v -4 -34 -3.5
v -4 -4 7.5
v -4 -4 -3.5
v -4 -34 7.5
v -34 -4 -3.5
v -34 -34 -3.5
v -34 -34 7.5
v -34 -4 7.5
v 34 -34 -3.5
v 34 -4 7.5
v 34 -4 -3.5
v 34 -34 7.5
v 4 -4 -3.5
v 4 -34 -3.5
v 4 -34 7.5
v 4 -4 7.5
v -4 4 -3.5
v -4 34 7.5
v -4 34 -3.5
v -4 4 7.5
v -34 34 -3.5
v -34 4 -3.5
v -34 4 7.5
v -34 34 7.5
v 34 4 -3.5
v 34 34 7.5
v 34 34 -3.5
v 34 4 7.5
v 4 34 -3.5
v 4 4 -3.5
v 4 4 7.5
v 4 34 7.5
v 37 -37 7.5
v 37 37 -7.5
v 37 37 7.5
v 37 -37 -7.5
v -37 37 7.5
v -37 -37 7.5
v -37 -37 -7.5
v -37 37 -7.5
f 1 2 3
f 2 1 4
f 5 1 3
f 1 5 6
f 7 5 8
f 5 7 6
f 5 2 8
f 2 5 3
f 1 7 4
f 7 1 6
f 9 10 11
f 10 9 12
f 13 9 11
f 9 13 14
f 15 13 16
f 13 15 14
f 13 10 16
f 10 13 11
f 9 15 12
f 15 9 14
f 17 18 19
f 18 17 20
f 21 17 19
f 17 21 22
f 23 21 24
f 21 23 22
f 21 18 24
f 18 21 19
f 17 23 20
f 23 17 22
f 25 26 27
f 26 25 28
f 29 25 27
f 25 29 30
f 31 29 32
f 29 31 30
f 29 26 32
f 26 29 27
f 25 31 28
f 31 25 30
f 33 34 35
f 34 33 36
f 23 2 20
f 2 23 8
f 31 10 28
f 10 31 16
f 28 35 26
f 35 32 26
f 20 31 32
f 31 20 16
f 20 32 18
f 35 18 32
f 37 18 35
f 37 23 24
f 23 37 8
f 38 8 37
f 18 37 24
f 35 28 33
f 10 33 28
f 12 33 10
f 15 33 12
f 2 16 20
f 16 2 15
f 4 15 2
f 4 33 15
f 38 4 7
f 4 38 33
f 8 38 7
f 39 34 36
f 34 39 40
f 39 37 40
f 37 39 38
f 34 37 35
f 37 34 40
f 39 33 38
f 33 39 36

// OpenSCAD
$fn = 32;

// ----------------------------------------------------------------------
// Pocket plate 74 x 74 x 15
// 2 x 2 pockets 30 mm square, 11 mm deep
// ----------------------------------------------------------------------

// --- parameters (mm) ---
thickness = 15;  // plate thickness
floor_t = 4;     // material left under each pocket
pocket = 30;     // pocket side length
pitch_x = 38;    // pocket pitch along X
pitch_y = 38;    // pocket pitch along Y
cols = 2;        // pockets per row
rows = 2;        // rows of pockets

// --- derived feature positions (mm) ---
depth = thickness - floor_t;        // = 11   pocket depth, down to the floor
span_x = (cols - 1) * pitch_x;      // = 38   distance between outer pockets
span_y = (rows - 1) * pitch_y;      // = 38   distance between outer pocket rows
origin_x = -span_x / 2;             // = -19   X of the first pocket
origin_y = -span_y / 2;             // = -19   Y of the first pocket
plate = [span_x + pocket + 6, span_y + pocket + 6, thickness];  // = [74, 74, 15]   overall size: pockets plus 3 mm of wall on each side
feature_centers = [
  [origin_x + 0 * pitch_x, origin_y + 0 * pitch_y],
  [origin_x + 1 * pitch_x, origin_y + 0 * pitch_y],
  [origin_x + 0 * pitch_x, origin_y + 1 * pitch_y],
  [origin_x + 1 * pitch_x, origin_y + 1 * pitch_y]
];   // pocket centres, used verbatim by the cutter loop

// plate outline, then one pocket per centre in feature_centers
difference() {
  cube(plate, center = true);
  for (centre = feature_centers)
    translate([centre[0] - pocket / 2, centre[1] - pocket / 2, plate[2] / 2 - depth])
      cube([pocket, pocket, depth + 1]);  // centred on the declared pocket centre
}
